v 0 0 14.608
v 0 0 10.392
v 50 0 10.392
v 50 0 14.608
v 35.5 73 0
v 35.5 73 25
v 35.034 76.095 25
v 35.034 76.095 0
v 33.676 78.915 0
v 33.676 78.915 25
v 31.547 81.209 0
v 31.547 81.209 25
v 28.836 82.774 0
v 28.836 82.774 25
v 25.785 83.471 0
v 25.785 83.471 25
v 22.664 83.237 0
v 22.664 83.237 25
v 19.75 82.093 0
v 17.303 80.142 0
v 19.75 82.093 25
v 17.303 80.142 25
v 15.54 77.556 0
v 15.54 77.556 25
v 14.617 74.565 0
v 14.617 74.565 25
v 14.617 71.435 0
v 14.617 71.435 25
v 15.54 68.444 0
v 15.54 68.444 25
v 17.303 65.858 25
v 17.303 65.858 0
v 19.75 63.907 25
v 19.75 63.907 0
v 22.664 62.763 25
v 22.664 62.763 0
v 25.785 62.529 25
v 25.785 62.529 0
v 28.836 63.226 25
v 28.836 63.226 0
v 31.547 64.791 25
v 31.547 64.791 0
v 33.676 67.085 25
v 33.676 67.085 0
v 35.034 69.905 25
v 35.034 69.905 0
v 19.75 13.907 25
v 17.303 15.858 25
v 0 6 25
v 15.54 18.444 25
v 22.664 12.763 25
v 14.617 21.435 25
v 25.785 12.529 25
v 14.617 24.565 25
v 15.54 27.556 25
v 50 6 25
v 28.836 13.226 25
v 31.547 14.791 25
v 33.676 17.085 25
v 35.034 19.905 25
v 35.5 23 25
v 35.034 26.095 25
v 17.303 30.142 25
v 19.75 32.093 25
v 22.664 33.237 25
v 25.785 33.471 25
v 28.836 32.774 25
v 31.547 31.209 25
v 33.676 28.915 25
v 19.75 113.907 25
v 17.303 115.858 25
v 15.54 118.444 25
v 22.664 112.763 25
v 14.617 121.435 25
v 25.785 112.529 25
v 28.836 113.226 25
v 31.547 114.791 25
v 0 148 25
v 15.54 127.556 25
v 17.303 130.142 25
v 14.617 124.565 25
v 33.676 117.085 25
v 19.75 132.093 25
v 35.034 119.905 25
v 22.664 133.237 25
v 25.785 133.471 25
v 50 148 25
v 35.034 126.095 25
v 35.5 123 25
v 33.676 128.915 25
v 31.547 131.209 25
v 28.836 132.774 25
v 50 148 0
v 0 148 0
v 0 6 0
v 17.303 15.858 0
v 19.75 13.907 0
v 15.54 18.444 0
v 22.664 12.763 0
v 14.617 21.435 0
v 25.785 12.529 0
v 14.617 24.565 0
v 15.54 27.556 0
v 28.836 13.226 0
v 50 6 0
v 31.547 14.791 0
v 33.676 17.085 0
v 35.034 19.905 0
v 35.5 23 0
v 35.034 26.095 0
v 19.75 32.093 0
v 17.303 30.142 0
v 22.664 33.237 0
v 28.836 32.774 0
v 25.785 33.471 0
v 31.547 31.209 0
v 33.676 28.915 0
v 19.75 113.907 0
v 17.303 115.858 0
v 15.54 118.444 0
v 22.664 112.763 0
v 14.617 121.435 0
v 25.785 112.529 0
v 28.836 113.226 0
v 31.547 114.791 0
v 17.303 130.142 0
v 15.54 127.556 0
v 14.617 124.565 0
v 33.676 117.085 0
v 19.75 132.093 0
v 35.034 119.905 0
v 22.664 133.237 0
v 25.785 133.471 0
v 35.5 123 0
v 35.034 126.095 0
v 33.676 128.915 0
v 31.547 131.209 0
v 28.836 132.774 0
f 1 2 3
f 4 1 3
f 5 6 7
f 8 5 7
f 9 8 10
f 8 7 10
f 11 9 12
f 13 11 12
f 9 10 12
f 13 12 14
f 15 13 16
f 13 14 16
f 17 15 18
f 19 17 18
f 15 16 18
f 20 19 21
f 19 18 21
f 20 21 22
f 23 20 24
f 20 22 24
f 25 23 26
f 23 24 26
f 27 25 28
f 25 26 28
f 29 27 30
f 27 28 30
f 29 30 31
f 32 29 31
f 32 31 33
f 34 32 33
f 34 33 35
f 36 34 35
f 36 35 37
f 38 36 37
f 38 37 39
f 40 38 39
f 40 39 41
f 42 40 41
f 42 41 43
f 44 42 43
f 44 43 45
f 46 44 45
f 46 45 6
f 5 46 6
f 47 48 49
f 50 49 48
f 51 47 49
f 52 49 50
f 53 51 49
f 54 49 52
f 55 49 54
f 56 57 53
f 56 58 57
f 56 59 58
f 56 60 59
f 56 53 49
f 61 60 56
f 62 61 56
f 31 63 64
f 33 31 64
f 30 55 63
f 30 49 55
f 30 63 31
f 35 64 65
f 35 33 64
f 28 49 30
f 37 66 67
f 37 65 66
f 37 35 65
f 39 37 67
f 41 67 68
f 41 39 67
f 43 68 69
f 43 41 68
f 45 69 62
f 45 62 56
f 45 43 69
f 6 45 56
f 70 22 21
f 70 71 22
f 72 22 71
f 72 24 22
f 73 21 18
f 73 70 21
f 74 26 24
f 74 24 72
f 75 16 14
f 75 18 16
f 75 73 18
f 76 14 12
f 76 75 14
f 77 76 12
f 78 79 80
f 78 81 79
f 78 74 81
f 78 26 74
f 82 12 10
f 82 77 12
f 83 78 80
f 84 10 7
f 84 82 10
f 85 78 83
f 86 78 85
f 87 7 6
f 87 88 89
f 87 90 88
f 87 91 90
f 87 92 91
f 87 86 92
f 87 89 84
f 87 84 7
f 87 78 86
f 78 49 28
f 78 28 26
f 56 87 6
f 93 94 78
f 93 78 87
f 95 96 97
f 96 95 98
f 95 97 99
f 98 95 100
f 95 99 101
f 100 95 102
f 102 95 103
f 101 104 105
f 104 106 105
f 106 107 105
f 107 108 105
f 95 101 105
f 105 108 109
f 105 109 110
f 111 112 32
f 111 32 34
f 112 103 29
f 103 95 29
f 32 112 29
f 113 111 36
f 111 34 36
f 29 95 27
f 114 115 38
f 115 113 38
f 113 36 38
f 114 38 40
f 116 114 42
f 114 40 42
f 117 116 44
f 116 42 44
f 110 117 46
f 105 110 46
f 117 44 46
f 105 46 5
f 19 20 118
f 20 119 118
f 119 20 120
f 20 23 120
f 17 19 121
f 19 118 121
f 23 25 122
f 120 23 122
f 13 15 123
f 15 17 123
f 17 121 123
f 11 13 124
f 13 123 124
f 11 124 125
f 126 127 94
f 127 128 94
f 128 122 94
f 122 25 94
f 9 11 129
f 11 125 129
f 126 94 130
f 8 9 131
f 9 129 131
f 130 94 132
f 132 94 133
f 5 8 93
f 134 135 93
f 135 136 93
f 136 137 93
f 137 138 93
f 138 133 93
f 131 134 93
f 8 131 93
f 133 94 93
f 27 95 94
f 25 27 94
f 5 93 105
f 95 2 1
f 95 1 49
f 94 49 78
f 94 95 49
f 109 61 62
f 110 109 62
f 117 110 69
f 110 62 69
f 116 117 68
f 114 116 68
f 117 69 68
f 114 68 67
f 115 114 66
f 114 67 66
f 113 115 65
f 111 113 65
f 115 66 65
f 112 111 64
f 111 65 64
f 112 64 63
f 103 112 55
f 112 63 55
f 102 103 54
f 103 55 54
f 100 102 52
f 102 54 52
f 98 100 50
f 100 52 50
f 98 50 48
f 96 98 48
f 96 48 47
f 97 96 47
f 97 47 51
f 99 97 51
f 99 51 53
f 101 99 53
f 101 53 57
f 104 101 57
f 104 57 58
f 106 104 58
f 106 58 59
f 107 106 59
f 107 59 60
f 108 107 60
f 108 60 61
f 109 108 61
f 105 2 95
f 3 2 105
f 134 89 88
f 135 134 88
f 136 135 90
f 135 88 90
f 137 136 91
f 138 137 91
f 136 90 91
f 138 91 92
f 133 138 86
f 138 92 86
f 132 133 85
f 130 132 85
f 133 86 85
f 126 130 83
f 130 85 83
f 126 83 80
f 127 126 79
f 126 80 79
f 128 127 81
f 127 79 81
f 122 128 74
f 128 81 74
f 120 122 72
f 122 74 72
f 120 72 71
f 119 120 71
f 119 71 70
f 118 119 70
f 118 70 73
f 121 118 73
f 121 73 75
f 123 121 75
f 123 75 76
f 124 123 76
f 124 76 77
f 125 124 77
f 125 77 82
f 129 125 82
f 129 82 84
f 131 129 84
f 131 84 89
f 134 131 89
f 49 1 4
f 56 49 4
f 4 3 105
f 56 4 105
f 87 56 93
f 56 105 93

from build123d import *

# Parameters (mm, degrees)
SKETCH_1_W          = 50
SKETCH_1_H          = 148
EXTRUDE_1_DEPTH     = 25
SKETCH_2_R          = 10.5
CUT_EXTRUDE_1_DEPTH = 26
CHAMFER_1_SIZE      = 6
CHAMFER_1_SIZE2     = 10.392304845
CHAMFER_2_SIZE      = 6
CHAMFER_2_SIZE2     = 10.392304845


with BuildPart() as part:
    # Эскиз1 → Бобышка-Вытянуть1 (new body)
    with BuildSketch(Plane.XY):
        with Locations((25, 74)):
            Rectangle(SKETCH_1_W, SKETCH_1_H)
    extrude(amount=EXTRUDE_1_DEPTH)

    # Эскиз2 → Вырез-Вытянуть1 (cut, through all)
    with BuildSketch(Plane.XY.offset(25)):
        with Locations((25, 23)):
            Circle(SKETCH_2_R)
        with Locations((25, 73)):
            Circle(SKETCH_2_R)
        with Locations((25, 123)):
            Circle(SKETCH_2_R)
    extrude(amount=-CUT_EXTRUDE_1_DEPTH, mode=Mode.SUBTRACT)

    # Фаска1
    chamfer_1_edges = [part.edges().sort_by_distance(p)[0] for p in [
        (25, 0, 0),
    ]]
    chamfer_1_side = [part.faces().sort_by_distance(p)[0] for p in [
        (25, 1.562177967, 0),
    ]]
    chamfer(chamfer_1_edges, length=CHAMFER_1_SIZE, length2=CHAMFER_1_SIZE2, reference=chamfer_1_side[0])

    # Фаска2
    chamfer_2_edges = [part.edges().sort_by_distance(p)[0] for p in [
        (25, 0, 25),
    ]]
    chamfer_2_side = [part.faces().sort_by_distance(p)[0] for p in [
        (25, 1.562177967, 25),
    ]]
    chamfer(chamfer_2_edges, length=CHAMFER_2_SIZE, length2=CHAMFER_2_SIZE2, reference=chamfer_2_side[0])


solid = part.part
